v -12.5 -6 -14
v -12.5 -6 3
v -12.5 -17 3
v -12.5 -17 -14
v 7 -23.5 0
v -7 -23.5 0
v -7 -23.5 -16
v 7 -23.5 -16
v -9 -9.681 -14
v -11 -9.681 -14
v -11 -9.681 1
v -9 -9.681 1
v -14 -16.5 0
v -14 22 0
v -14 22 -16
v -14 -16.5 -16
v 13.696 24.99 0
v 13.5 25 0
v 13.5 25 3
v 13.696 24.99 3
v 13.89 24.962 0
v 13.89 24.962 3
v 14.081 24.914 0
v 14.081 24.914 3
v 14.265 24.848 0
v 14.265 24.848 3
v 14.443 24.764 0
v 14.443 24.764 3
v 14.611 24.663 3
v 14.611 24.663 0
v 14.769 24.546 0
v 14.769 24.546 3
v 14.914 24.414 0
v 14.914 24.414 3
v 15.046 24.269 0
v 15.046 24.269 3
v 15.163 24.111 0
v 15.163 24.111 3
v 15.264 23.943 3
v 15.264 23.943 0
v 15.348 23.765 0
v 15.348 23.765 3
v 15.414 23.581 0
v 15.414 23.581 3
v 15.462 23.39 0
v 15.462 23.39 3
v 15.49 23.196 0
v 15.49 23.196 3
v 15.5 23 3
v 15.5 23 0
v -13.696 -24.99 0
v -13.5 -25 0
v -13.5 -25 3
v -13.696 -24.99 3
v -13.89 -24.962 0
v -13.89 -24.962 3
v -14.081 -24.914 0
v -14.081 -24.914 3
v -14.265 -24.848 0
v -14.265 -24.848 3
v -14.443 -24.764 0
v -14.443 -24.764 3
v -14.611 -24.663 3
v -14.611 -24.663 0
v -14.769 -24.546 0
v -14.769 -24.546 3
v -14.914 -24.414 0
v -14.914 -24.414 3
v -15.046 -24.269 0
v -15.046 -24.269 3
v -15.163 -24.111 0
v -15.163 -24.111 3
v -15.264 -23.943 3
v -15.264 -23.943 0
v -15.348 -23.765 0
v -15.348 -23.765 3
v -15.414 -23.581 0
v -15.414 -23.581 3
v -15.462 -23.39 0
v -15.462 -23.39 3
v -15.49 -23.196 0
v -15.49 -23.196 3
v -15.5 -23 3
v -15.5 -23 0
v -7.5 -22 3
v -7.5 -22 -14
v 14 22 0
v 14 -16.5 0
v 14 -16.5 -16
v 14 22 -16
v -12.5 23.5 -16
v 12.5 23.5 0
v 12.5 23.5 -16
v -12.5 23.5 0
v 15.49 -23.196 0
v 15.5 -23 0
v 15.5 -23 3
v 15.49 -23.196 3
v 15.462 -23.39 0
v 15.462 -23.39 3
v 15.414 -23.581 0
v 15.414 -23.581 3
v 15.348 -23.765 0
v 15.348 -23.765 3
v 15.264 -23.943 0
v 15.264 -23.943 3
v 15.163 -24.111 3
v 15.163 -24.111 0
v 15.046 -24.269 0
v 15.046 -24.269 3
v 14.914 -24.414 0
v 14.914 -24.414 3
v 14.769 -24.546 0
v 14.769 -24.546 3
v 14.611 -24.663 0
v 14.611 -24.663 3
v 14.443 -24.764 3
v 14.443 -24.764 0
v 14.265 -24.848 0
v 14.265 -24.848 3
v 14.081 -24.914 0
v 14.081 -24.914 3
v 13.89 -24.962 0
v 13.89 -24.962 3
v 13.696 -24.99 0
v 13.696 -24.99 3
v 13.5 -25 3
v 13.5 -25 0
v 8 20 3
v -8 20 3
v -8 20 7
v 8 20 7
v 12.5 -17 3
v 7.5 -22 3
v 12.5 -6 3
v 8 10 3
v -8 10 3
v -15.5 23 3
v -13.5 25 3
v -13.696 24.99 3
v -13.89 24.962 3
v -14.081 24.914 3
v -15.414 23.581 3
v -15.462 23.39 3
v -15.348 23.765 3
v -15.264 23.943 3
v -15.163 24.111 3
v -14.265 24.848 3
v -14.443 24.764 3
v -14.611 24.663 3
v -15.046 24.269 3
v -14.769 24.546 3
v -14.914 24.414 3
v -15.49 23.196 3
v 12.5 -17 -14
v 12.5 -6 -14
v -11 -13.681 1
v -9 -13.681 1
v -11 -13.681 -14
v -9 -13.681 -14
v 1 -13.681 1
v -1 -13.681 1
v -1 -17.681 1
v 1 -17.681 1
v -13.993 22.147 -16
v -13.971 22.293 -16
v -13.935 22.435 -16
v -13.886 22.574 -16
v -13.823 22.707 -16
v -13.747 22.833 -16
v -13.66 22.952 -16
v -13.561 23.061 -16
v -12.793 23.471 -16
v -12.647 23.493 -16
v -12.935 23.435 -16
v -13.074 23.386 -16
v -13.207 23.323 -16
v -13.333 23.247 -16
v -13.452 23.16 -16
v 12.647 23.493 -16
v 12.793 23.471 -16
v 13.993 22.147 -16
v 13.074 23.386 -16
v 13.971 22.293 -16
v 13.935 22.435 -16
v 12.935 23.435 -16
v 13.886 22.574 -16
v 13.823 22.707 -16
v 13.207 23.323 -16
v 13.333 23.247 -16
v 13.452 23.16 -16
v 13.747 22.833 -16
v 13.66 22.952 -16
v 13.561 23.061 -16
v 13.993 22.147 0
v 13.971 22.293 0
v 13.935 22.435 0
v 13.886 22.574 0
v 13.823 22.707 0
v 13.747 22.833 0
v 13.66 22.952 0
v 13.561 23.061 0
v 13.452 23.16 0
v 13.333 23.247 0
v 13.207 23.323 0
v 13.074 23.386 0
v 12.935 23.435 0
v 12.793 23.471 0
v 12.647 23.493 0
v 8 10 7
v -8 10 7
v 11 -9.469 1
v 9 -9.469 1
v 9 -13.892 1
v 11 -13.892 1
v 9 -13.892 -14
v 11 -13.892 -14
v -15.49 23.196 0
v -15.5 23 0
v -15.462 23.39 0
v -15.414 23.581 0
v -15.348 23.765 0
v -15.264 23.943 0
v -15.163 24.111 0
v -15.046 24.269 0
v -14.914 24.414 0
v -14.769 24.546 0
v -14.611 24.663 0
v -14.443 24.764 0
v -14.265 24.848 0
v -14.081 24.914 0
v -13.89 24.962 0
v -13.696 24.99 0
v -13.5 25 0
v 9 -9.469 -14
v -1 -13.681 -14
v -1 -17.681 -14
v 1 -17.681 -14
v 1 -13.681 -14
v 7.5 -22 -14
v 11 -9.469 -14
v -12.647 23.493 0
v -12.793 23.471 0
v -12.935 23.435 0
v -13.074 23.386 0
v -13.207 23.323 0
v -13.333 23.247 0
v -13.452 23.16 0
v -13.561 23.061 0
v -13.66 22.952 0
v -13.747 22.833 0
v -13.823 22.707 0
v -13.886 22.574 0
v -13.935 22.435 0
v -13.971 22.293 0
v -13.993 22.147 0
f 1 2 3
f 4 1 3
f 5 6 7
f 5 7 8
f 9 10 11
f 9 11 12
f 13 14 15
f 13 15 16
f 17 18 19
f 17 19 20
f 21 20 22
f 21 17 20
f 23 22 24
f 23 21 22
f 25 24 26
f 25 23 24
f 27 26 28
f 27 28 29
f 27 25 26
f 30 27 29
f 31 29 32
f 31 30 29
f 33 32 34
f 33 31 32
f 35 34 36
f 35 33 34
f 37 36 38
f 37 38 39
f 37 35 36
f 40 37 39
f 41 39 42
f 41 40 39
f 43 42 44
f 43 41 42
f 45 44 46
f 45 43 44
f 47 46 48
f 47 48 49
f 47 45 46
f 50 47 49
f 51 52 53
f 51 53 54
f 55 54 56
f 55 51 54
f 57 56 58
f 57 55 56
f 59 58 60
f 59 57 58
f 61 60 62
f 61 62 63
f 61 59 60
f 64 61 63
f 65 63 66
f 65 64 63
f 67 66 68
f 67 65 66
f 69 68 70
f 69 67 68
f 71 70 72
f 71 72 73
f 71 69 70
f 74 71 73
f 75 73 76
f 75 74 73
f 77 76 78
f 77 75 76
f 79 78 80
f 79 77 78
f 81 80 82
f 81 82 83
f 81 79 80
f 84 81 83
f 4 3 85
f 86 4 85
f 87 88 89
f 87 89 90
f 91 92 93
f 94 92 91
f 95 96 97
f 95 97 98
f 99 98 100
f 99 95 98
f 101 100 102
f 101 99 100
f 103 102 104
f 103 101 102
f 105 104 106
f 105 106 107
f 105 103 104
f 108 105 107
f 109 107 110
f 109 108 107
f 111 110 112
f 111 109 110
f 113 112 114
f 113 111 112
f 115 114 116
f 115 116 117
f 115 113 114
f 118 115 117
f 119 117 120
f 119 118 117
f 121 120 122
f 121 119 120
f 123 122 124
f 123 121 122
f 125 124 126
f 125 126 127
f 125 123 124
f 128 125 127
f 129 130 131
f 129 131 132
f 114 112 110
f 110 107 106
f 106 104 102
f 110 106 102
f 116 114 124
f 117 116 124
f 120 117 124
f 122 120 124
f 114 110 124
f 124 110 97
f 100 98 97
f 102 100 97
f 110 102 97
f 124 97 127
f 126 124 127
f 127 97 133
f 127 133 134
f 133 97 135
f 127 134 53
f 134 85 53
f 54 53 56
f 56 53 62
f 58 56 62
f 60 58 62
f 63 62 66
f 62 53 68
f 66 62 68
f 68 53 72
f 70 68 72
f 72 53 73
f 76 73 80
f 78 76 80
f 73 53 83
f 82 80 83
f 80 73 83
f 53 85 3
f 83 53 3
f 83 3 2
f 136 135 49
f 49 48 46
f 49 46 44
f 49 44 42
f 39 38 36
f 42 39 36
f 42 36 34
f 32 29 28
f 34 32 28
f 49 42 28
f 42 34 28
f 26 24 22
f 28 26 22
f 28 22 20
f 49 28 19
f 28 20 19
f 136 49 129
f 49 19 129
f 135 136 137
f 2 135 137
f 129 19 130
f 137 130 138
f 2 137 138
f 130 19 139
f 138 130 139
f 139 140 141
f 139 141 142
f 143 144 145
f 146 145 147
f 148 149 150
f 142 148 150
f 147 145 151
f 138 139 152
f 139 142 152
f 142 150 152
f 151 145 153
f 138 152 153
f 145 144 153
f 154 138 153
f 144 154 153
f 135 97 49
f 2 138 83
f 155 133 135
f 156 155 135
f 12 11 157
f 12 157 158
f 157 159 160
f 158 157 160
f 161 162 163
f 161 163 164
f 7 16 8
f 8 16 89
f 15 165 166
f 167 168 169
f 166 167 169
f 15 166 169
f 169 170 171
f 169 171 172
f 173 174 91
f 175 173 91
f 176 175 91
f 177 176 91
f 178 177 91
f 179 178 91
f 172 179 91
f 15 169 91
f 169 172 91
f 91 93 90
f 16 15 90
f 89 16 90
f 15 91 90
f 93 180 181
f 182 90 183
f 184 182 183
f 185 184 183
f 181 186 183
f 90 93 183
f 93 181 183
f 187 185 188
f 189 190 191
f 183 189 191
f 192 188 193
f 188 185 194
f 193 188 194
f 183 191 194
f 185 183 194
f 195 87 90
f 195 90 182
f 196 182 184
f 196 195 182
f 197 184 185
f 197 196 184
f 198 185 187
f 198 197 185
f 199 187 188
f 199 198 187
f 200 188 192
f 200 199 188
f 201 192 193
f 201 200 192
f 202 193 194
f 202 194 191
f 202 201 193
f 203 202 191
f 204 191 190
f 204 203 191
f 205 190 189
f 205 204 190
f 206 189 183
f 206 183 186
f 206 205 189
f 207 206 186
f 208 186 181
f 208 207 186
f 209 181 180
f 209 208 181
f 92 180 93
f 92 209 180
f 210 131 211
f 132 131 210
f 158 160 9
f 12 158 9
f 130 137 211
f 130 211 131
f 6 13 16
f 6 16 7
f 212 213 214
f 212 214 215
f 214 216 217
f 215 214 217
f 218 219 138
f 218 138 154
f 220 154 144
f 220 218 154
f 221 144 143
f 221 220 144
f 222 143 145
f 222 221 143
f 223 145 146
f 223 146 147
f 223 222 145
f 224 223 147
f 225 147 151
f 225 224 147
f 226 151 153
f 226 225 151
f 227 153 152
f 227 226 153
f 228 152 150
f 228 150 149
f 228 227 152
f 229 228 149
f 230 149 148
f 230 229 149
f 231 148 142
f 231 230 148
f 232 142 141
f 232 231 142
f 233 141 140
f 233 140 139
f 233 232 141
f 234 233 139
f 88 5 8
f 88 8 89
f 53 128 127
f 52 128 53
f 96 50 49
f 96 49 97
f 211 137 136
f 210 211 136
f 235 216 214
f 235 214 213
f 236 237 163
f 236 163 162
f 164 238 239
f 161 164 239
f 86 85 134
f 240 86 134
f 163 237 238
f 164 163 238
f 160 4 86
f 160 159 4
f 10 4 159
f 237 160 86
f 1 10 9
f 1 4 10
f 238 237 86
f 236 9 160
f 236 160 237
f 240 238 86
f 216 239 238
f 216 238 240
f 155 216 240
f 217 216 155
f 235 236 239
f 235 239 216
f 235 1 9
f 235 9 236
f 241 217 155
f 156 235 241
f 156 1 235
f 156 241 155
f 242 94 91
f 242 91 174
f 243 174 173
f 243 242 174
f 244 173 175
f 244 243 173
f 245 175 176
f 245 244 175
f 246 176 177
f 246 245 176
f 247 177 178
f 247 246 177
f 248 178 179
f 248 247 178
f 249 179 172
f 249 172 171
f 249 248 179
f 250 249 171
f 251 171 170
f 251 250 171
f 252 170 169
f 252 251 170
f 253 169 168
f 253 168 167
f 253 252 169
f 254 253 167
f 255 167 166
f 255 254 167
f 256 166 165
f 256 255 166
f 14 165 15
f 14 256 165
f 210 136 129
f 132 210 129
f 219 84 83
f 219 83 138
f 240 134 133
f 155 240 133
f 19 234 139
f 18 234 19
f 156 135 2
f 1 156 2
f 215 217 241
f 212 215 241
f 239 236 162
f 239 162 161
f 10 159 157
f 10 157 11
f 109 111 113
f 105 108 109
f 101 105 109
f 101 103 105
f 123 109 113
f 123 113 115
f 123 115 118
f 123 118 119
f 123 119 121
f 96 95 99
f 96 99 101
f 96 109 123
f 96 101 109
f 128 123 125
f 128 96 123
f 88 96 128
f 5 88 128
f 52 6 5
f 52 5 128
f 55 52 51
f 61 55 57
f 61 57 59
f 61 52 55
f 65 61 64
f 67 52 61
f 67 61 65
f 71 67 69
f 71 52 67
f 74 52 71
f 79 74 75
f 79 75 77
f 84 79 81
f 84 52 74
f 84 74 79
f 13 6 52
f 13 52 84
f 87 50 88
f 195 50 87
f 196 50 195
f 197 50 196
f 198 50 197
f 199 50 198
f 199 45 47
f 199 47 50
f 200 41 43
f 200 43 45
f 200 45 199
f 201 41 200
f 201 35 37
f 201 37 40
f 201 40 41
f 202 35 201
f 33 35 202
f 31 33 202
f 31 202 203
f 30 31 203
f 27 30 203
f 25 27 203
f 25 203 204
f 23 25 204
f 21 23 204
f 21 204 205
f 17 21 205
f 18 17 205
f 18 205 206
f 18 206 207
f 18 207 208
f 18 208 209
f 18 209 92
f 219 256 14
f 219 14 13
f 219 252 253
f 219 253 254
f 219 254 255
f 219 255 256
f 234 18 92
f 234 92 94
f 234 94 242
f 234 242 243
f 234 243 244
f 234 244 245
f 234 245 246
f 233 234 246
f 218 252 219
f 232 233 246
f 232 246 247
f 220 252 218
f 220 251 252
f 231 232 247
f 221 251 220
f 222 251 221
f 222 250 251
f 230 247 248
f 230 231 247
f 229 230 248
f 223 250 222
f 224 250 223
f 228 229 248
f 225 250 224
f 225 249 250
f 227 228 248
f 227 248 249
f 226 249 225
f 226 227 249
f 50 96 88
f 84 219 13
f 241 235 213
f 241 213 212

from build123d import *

# Parameters (mm, degrees)
BOSS_EXTRUDE1_DEPTH = 3
BOSS_EXTRUDE2_DEPTH = 16
SKETCH3_W           = 16
SKETCH3_H           = 10
BOSS_EXTRUDE3_DEPTH = 4
CUT_EXTRUDE1_DEPTH  = 17
SKETCH5_W           = 2
SKETCH5_H           = 4
SKETCH5_H_2         = 4.422760465
BOSS_EXTRUDE4_DEPTH = 15


with BuildPart() as part:
    # Sketch1 → Boss-Extrude1 (new body)
    with BuildSketch(Plane.XY):
        with BuildLine():
            Line((-13.5, 25), (13.5, 25))
            ThreePointArc((13.5, 25), (14.914213562, 24.414213562), (15.5, 23))
            Line((15.5, 23), (15.5, -23))
            ThreePointArc((15.5, -23), (14.914213562, -24.414213562), (13.5, -25))
            Line((13.5, -25), (-13.5, -25))
            ThreePointArc((-13.5, -25), (-14.914213562, -24.414213562), (-15.5, -23))
            Line((-15.5, -23), (-15.5, 23))
            ThreePointArc((-15.5, 23), (-14.914213562, 24.414213562), (-13.5, 25))
        make_face()
    extrude(amount=BOSS_EXTRUDE1_DEPTH)

    # Sketch2 → Boss-Extrude2 (add)
    with BuildSketch(Plane(origin=(0, 0, 0), x_dir=(-1, 0, 0), z_dir=(0, 0, -1))):
        with BuildLine():
            Line((-12.5, 23.5), (12.5, 23.5))
            ThreePointArc((12.5, 23.5), (13.560660172, 23.060660172), (14, 22))
            Line((14, 22), (14, -16.5))
            Line((14, -16.5), (7, -23.5))
            Line((7, -23.5), (-7, -23.5))
            Line((-7, -23.5), (-14, -16.5))
            Line((-14, -16.5), (-14, 22))
            ThreePointArc((-14, 22), (-13.560660172, 23.060660172), (-12.5, 23.5))
        make_face()
    extrude(amount=BOSS_EXTRUDE2_DEPTH)

    # Sketch3 → Boss-Extrude3 (add)
    with BuildSketch(Plane.XY.offset(3)):
        with Locations((0, 15)):
            Rectangle(SKETCH3_W, SKETCH3_H)
    extrude(amount=BOSS_EXTRUDE3_DEPTH)

    # Sketch4 → Cut-Extrude1 (cut)
    with BuildSketch(Plane.XY.offset(3)):
        Polygon((-12.5, -17), (-7.5, -22), (7.5, -22), (12.5, -17), (12.5, -6), (-12.5, -6), align=None)
    extrude(amount=-CUT_EXTRUDE1_DEPTH, mode=Mode.SUBTRACT)

    # Sketch5 → Boss-Extrude4 (add)
    with BuildSketch(Plane.XY.offset(-14)):
        with Locations((0, -15.680542245)):
            Rectangle(SKETCH5_W, SKETCH5_H)
        with Locations((-10, -11.680542245)):
            Rectangle(SKETCH5_W, SKETCH5_H)
        with Locations((10, -11.680542244)):
            Rectangle(SKETCH5_W, SKETCH5_H_2)
    extrude(amount=BOSS_EXTRUDE4_DEPTH)


solid = part.part
